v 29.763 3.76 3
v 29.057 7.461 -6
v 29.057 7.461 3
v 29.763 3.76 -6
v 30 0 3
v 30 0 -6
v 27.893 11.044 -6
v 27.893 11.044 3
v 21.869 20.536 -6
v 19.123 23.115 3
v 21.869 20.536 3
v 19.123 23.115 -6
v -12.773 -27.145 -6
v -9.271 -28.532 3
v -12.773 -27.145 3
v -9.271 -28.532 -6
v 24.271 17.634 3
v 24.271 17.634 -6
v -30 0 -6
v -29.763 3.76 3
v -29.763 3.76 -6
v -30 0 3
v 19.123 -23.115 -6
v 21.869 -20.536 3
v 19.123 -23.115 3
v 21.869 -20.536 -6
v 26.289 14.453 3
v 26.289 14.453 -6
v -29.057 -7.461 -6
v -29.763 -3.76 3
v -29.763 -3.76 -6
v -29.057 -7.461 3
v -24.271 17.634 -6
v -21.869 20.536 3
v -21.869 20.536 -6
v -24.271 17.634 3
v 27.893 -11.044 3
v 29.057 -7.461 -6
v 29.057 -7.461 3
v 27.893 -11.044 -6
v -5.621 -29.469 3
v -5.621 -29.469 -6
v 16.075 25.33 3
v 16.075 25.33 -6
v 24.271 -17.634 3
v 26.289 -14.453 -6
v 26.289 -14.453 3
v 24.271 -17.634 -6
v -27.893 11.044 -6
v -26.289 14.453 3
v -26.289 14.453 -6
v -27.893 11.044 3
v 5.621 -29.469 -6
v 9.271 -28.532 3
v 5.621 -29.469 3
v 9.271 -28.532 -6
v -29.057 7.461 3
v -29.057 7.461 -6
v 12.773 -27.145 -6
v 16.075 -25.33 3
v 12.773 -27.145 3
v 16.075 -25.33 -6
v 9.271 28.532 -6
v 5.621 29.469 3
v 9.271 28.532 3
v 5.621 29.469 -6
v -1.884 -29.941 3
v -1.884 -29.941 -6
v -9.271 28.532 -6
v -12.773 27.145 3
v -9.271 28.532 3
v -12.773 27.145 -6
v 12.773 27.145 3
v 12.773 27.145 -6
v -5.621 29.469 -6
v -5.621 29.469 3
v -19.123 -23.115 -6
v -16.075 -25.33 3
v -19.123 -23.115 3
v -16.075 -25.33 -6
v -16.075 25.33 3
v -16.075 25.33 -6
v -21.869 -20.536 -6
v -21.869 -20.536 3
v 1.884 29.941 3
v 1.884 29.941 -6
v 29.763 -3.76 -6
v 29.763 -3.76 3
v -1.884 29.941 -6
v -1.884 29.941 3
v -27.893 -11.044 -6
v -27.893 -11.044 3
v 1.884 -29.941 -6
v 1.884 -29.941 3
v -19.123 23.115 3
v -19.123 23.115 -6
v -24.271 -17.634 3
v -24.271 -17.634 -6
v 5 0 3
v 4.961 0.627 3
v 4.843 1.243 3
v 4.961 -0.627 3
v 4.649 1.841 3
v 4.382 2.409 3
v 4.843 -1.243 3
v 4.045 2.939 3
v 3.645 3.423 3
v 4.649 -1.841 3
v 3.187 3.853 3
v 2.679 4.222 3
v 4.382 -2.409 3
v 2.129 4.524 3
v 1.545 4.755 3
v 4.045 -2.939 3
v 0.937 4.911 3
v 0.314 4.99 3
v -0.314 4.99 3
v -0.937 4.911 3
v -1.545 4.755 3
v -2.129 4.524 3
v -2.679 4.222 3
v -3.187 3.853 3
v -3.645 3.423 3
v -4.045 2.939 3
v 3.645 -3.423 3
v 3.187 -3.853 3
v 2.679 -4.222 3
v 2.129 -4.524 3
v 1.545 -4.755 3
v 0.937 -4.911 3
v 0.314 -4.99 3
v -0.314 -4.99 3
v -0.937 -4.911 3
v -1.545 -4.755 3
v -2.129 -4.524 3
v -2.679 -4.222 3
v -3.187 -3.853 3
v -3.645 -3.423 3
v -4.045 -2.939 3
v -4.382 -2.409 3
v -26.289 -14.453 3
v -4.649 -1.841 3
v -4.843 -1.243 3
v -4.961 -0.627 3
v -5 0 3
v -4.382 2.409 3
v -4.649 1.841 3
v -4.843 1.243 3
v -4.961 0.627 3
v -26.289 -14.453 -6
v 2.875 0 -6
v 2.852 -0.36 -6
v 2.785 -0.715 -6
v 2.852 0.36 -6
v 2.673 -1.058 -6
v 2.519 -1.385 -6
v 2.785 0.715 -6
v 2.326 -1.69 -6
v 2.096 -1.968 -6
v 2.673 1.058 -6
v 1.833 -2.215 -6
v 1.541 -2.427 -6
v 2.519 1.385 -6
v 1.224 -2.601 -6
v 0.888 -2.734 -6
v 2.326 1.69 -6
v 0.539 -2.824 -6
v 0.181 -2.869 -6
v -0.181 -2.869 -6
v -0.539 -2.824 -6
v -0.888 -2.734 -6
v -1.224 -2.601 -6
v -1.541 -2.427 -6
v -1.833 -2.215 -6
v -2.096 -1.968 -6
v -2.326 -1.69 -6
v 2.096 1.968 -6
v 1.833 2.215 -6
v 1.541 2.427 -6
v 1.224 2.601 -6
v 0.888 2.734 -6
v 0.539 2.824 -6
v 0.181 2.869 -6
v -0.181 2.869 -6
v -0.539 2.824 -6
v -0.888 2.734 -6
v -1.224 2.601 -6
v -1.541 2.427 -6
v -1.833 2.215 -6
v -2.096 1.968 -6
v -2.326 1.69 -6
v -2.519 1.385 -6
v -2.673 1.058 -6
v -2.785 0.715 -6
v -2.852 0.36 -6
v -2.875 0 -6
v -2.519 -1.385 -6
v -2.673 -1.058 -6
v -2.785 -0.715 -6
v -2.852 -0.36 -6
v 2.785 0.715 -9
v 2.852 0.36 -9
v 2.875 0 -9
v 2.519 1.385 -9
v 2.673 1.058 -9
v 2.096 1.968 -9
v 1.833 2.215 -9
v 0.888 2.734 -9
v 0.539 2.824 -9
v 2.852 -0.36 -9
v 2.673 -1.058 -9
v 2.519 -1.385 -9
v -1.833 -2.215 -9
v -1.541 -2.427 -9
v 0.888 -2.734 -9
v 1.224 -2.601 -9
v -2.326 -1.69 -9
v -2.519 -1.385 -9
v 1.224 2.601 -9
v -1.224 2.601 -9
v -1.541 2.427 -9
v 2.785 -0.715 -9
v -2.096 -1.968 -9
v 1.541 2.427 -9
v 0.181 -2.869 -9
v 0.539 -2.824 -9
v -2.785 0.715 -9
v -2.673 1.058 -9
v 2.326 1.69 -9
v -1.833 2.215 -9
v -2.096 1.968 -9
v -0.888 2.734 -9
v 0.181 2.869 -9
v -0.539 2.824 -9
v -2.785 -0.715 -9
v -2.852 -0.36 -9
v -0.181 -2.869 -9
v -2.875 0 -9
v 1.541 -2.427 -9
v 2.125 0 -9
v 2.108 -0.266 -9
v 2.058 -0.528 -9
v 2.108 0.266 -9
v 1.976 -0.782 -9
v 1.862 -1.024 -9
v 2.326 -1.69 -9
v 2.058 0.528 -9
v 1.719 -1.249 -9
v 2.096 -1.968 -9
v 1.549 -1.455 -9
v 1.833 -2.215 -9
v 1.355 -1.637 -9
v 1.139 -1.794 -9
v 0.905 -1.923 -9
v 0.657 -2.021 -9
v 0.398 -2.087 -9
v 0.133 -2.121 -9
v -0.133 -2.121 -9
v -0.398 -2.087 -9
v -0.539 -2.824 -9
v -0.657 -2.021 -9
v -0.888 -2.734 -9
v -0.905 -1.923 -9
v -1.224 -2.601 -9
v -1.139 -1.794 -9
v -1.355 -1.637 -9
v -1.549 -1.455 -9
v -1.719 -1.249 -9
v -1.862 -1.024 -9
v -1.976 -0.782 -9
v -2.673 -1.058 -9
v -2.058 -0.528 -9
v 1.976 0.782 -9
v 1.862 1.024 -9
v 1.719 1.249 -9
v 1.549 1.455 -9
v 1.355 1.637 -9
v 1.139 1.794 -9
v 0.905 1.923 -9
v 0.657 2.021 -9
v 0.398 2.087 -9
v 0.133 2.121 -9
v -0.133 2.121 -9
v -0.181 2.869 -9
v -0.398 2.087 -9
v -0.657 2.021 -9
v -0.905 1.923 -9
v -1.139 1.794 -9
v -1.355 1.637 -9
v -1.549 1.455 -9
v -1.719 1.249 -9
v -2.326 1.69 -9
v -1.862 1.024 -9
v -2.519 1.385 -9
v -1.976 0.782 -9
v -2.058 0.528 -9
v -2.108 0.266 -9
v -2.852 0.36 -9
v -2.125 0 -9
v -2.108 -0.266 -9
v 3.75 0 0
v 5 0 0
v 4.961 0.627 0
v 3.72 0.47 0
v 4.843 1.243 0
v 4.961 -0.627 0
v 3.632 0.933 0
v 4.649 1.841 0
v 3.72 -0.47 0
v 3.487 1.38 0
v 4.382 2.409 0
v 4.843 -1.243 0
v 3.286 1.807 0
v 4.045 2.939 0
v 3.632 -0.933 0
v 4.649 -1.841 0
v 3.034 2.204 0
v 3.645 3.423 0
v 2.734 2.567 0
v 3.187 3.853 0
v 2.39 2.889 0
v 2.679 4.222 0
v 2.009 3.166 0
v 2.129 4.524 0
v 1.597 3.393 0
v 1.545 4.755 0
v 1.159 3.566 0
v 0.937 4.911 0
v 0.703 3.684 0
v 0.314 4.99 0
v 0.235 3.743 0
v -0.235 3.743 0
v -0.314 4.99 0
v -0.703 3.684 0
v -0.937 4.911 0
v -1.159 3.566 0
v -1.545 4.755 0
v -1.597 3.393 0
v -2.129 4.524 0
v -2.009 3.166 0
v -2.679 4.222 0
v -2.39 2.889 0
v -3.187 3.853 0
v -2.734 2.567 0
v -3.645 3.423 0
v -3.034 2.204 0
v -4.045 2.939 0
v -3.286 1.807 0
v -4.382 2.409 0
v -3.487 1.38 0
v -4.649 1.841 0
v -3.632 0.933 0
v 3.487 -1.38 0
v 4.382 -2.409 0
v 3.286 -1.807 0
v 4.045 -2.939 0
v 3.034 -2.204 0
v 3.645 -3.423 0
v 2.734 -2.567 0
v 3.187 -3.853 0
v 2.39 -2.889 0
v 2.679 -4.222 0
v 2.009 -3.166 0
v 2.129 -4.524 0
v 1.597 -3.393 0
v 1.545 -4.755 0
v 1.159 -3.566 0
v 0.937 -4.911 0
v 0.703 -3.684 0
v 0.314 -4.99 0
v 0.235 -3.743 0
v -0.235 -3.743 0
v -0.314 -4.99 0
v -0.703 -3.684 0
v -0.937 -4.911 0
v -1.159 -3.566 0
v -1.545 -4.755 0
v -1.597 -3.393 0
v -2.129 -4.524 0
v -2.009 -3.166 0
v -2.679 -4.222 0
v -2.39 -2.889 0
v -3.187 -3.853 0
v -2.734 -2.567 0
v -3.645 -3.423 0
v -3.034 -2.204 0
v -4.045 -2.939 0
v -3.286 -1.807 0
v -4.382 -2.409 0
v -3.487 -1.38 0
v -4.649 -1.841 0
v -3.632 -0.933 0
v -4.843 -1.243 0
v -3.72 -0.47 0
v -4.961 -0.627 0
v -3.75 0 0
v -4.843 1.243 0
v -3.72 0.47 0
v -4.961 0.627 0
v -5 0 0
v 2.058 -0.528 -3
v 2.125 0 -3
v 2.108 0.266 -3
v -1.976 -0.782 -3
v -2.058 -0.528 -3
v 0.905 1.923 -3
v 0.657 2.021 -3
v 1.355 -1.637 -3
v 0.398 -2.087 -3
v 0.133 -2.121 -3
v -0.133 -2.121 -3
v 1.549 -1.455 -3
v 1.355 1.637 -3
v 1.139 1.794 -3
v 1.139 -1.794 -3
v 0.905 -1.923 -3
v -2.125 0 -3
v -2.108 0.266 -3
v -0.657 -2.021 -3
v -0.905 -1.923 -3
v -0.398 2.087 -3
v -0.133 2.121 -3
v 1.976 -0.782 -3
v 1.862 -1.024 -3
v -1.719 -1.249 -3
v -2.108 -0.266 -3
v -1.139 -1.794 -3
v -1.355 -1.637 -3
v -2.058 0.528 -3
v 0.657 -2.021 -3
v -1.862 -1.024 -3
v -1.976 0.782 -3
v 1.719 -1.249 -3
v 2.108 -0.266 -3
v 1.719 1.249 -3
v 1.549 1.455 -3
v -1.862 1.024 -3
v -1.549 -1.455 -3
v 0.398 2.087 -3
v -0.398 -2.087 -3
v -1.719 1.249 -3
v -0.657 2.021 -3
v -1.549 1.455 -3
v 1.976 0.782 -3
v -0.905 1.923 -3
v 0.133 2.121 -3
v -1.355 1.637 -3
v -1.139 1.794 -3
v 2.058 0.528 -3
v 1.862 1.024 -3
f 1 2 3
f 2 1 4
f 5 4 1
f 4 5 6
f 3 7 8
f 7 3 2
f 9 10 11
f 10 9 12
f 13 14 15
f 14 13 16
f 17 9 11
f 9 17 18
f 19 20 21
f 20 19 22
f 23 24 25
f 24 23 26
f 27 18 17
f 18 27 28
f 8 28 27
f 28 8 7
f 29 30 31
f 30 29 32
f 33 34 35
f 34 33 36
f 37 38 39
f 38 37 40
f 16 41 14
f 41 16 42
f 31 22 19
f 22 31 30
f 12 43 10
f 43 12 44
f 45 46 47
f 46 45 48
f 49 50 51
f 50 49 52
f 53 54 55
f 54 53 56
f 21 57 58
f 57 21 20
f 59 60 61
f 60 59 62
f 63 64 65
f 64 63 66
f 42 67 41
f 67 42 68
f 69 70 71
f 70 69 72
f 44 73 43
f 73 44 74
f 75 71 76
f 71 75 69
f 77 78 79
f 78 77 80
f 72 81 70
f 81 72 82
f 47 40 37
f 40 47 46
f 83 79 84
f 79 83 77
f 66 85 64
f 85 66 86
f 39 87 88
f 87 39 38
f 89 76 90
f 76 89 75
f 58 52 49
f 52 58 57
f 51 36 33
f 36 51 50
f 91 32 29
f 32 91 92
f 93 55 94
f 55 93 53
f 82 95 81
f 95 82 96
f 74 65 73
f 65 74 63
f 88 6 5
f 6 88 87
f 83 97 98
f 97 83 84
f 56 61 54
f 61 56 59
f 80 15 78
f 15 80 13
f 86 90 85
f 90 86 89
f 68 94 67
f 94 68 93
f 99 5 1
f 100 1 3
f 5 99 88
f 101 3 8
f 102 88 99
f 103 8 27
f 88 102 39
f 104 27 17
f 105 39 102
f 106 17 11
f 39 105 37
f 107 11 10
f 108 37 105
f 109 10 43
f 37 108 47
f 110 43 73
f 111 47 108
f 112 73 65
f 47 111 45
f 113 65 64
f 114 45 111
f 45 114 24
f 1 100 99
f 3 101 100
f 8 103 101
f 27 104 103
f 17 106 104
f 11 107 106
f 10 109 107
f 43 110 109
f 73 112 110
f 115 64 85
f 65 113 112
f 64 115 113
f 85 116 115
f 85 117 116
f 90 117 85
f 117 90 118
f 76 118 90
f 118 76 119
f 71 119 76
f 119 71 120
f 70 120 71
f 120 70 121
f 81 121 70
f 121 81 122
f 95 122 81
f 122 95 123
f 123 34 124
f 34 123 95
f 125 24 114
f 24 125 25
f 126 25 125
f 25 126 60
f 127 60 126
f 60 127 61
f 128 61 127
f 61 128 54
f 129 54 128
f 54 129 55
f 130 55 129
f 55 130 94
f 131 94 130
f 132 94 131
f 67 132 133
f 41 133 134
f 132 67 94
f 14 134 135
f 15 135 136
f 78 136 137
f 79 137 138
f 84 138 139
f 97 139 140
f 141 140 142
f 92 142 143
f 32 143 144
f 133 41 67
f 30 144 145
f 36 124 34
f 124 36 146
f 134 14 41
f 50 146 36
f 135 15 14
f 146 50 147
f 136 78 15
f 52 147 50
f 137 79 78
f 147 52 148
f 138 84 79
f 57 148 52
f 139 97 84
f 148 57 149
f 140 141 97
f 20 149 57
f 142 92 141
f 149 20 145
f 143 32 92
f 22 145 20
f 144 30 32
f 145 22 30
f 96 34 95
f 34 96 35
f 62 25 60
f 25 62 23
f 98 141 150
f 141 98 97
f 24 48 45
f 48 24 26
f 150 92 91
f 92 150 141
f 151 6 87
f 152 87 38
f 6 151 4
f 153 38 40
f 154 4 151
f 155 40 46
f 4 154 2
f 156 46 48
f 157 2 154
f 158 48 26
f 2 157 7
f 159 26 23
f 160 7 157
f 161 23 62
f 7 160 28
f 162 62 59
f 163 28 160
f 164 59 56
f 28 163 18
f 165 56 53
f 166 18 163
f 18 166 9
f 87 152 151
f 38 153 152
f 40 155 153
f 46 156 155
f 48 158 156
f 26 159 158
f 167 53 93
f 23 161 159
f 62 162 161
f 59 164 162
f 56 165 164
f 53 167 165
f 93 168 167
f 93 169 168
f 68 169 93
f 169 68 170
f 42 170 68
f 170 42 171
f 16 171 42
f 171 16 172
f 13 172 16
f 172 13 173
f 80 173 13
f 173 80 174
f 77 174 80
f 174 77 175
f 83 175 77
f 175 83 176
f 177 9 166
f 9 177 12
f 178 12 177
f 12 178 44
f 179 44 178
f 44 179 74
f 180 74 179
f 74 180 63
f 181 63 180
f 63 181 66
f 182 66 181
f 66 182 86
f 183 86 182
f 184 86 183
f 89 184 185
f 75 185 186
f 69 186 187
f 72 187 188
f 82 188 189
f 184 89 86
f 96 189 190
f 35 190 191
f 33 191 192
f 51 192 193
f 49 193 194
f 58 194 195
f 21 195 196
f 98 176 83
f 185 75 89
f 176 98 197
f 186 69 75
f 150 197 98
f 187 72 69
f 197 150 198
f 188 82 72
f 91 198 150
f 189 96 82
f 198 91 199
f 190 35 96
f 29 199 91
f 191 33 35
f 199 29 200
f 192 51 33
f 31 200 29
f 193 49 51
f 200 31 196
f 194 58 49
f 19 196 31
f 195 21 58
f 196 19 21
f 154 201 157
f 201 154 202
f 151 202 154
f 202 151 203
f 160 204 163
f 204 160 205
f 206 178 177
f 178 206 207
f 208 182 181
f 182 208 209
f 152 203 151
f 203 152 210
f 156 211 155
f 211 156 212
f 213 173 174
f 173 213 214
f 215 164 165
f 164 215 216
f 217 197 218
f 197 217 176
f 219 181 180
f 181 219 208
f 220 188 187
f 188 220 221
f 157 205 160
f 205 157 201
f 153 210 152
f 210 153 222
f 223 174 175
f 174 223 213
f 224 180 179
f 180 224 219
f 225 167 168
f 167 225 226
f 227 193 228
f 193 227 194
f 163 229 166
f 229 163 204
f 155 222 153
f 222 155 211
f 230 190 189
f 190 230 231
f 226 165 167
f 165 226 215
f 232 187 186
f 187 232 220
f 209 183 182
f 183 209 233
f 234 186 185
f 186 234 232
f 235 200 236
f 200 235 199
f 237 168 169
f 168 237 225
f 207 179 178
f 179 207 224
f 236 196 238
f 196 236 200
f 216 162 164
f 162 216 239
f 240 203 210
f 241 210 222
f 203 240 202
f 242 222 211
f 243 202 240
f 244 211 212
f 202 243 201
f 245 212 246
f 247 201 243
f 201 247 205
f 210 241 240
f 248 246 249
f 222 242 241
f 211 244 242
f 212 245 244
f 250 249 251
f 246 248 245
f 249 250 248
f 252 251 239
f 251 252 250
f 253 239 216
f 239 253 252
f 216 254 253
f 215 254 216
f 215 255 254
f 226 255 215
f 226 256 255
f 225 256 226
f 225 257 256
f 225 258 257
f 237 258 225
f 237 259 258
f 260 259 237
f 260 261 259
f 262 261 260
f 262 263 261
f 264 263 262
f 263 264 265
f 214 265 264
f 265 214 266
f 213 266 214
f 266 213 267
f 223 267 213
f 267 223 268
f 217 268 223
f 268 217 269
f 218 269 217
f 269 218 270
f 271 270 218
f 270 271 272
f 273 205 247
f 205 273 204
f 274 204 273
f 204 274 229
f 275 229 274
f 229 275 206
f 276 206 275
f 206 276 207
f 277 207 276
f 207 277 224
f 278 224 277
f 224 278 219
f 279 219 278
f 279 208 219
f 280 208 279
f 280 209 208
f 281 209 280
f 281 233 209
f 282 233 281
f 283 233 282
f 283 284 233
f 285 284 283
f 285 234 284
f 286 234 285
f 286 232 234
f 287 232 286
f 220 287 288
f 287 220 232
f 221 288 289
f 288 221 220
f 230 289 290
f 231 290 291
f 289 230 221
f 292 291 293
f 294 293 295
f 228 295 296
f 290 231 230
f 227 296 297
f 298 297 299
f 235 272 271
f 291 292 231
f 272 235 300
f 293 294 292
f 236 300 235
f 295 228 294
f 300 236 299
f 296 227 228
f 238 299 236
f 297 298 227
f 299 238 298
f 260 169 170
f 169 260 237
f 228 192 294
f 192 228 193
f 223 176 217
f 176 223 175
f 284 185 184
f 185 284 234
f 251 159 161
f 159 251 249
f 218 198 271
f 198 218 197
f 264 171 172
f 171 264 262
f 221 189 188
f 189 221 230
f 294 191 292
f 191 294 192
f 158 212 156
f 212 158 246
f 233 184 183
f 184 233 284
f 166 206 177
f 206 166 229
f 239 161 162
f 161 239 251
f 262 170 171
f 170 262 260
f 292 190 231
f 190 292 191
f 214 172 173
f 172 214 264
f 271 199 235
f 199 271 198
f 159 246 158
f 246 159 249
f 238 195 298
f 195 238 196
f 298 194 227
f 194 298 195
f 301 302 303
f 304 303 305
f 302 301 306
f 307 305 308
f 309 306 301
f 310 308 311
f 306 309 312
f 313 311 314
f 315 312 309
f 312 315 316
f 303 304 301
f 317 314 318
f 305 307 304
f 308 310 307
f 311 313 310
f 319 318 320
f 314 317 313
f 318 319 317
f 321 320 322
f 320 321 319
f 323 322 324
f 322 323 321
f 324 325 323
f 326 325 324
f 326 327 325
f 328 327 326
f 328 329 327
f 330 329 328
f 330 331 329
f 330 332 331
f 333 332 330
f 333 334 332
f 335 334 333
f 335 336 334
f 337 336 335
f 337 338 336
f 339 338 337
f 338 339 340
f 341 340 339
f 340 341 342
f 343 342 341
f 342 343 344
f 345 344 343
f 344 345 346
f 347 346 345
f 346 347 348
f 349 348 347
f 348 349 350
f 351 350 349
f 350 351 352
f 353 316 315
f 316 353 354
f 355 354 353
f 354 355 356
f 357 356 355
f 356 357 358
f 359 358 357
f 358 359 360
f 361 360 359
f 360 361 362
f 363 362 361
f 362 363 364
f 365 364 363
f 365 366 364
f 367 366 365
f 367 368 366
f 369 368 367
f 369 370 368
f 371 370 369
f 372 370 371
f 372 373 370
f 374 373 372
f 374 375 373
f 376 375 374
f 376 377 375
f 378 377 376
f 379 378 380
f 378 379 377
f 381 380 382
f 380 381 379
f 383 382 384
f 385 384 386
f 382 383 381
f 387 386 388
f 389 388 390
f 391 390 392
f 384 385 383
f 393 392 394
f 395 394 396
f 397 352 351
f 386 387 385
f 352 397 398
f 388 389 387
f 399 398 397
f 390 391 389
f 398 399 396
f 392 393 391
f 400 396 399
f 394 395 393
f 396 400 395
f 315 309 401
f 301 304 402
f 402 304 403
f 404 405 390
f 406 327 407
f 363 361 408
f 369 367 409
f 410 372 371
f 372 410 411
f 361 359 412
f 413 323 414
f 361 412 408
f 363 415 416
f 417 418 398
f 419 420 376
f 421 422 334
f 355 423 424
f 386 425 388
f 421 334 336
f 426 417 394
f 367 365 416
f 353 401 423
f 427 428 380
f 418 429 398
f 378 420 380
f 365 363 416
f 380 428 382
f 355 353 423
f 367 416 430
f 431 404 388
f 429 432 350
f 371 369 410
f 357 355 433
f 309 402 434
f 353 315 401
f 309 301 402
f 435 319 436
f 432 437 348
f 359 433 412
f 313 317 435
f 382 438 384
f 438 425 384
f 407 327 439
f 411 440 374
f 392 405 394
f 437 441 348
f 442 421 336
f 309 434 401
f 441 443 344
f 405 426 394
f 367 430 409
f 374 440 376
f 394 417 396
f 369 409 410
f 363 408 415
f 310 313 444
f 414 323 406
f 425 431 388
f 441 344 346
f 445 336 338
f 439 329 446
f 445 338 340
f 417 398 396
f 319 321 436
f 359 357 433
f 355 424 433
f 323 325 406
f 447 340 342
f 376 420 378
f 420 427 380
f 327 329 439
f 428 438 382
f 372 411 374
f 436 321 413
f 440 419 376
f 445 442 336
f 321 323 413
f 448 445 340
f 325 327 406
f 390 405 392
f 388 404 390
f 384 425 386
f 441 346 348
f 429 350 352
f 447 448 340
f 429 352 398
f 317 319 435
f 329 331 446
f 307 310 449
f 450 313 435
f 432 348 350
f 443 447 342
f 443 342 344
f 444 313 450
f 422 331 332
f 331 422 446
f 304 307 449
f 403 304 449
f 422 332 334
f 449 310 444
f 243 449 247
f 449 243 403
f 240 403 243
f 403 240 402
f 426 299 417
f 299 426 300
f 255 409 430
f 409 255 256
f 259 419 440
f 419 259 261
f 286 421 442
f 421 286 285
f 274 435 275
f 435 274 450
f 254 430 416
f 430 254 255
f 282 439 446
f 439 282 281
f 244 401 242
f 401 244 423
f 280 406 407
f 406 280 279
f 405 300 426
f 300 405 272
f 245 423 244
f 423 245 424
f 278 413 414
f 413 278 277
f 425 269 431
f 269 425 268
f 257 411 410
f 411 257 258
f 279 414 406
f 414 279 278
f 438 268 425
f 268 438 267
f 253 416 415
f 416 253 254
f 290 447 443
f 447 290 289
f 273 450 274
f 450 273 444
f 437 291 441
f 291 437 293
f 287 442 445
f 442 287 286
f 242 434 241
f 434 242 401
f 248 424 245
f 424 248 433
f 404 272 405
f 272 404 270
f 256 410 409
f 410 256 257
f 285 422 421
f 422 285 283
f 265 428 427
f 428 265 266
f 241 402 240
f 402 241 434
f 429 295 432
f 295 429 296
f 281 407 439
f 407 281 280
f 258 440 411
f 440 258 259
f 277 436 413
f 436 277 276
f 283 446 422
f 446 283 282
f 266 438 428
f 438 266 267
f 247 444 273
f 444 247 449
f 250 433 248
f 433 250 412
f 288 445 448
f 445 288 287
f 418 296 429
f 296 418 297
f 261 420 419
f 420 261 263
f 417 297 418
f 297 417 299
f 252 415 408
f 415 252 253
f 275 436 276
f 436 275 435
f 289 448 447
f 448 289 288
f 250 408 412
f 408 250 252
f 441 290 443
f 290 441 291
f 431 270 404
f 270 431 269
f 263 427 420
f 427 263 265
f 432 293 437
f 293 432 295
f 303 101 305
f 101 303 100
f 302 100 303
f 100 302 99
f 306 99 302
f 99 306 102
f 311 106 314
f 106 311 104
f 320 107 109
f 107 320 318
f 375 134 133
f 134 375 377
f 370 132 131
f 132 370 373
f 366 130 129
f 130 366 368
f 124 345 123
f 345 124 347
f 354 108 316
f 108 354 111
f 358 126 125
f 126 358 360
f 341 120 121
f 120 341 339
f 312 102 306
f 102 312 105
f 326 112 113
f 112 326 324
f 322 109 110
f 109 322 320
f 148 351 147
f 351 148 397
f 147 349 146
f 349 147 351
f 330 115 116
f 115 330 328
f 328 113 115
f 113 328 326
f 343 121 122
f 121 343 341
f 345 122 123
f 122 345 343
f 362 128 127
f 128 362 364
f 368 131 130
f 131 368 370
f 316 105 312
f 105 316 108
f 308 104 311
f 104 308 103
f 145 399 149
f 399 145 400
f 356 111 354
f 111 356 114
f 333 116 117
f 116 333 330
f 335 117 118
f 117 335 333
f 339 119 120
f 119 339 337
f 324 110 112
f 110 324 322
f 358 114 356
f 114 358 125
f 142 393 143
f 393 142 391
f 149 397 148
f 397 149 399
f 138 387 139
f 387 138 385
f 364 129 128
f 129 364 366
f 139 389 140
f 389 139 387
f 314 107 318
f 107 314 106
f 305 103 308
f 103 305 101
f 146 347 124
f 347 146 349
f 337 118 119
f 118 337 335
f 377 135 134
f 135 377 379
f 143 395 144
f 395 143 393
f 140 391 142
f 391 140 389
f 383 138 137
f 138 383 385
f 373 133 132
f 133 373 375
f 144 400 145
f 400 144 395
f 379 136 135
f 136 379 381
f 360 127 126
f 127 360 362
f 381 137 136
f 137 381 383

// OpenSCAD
$fn = 50;

difference() {
	union() {
		translate(v = [0, 0, -6.0]) {
			cylinder(h = 9, r = 30.0);
		}
		#translate(v = [0, 0, -9.0]) {
			cylinder(h = 9, r = 2.875);
		}
	}
	union() {
		translate(v = [0, 0, 0]) {
			rotate(a = [0, 0, 0]) {
				difference() {
					union() {
						translate(v = [0, 0, -9.0]) {
							cylinder(h = 9, r = 2.0);
						}
						translate(v = [0, 0, -3]) {
							cylinder(h = 3, r1 = 2.125, r2 = 3.75);
						}
						translate(v = [0, 0, -9.0]) {
							cylinder(h = 9, r = 2.125);
						}
						translate(v = [0, 0, -9.0]) {
							cylinder(h = 9, r = 2.0);
						}
					}
					union();
				}
			}
		}
		#cylinder(h = 3, r = 5.0);
	}
}
